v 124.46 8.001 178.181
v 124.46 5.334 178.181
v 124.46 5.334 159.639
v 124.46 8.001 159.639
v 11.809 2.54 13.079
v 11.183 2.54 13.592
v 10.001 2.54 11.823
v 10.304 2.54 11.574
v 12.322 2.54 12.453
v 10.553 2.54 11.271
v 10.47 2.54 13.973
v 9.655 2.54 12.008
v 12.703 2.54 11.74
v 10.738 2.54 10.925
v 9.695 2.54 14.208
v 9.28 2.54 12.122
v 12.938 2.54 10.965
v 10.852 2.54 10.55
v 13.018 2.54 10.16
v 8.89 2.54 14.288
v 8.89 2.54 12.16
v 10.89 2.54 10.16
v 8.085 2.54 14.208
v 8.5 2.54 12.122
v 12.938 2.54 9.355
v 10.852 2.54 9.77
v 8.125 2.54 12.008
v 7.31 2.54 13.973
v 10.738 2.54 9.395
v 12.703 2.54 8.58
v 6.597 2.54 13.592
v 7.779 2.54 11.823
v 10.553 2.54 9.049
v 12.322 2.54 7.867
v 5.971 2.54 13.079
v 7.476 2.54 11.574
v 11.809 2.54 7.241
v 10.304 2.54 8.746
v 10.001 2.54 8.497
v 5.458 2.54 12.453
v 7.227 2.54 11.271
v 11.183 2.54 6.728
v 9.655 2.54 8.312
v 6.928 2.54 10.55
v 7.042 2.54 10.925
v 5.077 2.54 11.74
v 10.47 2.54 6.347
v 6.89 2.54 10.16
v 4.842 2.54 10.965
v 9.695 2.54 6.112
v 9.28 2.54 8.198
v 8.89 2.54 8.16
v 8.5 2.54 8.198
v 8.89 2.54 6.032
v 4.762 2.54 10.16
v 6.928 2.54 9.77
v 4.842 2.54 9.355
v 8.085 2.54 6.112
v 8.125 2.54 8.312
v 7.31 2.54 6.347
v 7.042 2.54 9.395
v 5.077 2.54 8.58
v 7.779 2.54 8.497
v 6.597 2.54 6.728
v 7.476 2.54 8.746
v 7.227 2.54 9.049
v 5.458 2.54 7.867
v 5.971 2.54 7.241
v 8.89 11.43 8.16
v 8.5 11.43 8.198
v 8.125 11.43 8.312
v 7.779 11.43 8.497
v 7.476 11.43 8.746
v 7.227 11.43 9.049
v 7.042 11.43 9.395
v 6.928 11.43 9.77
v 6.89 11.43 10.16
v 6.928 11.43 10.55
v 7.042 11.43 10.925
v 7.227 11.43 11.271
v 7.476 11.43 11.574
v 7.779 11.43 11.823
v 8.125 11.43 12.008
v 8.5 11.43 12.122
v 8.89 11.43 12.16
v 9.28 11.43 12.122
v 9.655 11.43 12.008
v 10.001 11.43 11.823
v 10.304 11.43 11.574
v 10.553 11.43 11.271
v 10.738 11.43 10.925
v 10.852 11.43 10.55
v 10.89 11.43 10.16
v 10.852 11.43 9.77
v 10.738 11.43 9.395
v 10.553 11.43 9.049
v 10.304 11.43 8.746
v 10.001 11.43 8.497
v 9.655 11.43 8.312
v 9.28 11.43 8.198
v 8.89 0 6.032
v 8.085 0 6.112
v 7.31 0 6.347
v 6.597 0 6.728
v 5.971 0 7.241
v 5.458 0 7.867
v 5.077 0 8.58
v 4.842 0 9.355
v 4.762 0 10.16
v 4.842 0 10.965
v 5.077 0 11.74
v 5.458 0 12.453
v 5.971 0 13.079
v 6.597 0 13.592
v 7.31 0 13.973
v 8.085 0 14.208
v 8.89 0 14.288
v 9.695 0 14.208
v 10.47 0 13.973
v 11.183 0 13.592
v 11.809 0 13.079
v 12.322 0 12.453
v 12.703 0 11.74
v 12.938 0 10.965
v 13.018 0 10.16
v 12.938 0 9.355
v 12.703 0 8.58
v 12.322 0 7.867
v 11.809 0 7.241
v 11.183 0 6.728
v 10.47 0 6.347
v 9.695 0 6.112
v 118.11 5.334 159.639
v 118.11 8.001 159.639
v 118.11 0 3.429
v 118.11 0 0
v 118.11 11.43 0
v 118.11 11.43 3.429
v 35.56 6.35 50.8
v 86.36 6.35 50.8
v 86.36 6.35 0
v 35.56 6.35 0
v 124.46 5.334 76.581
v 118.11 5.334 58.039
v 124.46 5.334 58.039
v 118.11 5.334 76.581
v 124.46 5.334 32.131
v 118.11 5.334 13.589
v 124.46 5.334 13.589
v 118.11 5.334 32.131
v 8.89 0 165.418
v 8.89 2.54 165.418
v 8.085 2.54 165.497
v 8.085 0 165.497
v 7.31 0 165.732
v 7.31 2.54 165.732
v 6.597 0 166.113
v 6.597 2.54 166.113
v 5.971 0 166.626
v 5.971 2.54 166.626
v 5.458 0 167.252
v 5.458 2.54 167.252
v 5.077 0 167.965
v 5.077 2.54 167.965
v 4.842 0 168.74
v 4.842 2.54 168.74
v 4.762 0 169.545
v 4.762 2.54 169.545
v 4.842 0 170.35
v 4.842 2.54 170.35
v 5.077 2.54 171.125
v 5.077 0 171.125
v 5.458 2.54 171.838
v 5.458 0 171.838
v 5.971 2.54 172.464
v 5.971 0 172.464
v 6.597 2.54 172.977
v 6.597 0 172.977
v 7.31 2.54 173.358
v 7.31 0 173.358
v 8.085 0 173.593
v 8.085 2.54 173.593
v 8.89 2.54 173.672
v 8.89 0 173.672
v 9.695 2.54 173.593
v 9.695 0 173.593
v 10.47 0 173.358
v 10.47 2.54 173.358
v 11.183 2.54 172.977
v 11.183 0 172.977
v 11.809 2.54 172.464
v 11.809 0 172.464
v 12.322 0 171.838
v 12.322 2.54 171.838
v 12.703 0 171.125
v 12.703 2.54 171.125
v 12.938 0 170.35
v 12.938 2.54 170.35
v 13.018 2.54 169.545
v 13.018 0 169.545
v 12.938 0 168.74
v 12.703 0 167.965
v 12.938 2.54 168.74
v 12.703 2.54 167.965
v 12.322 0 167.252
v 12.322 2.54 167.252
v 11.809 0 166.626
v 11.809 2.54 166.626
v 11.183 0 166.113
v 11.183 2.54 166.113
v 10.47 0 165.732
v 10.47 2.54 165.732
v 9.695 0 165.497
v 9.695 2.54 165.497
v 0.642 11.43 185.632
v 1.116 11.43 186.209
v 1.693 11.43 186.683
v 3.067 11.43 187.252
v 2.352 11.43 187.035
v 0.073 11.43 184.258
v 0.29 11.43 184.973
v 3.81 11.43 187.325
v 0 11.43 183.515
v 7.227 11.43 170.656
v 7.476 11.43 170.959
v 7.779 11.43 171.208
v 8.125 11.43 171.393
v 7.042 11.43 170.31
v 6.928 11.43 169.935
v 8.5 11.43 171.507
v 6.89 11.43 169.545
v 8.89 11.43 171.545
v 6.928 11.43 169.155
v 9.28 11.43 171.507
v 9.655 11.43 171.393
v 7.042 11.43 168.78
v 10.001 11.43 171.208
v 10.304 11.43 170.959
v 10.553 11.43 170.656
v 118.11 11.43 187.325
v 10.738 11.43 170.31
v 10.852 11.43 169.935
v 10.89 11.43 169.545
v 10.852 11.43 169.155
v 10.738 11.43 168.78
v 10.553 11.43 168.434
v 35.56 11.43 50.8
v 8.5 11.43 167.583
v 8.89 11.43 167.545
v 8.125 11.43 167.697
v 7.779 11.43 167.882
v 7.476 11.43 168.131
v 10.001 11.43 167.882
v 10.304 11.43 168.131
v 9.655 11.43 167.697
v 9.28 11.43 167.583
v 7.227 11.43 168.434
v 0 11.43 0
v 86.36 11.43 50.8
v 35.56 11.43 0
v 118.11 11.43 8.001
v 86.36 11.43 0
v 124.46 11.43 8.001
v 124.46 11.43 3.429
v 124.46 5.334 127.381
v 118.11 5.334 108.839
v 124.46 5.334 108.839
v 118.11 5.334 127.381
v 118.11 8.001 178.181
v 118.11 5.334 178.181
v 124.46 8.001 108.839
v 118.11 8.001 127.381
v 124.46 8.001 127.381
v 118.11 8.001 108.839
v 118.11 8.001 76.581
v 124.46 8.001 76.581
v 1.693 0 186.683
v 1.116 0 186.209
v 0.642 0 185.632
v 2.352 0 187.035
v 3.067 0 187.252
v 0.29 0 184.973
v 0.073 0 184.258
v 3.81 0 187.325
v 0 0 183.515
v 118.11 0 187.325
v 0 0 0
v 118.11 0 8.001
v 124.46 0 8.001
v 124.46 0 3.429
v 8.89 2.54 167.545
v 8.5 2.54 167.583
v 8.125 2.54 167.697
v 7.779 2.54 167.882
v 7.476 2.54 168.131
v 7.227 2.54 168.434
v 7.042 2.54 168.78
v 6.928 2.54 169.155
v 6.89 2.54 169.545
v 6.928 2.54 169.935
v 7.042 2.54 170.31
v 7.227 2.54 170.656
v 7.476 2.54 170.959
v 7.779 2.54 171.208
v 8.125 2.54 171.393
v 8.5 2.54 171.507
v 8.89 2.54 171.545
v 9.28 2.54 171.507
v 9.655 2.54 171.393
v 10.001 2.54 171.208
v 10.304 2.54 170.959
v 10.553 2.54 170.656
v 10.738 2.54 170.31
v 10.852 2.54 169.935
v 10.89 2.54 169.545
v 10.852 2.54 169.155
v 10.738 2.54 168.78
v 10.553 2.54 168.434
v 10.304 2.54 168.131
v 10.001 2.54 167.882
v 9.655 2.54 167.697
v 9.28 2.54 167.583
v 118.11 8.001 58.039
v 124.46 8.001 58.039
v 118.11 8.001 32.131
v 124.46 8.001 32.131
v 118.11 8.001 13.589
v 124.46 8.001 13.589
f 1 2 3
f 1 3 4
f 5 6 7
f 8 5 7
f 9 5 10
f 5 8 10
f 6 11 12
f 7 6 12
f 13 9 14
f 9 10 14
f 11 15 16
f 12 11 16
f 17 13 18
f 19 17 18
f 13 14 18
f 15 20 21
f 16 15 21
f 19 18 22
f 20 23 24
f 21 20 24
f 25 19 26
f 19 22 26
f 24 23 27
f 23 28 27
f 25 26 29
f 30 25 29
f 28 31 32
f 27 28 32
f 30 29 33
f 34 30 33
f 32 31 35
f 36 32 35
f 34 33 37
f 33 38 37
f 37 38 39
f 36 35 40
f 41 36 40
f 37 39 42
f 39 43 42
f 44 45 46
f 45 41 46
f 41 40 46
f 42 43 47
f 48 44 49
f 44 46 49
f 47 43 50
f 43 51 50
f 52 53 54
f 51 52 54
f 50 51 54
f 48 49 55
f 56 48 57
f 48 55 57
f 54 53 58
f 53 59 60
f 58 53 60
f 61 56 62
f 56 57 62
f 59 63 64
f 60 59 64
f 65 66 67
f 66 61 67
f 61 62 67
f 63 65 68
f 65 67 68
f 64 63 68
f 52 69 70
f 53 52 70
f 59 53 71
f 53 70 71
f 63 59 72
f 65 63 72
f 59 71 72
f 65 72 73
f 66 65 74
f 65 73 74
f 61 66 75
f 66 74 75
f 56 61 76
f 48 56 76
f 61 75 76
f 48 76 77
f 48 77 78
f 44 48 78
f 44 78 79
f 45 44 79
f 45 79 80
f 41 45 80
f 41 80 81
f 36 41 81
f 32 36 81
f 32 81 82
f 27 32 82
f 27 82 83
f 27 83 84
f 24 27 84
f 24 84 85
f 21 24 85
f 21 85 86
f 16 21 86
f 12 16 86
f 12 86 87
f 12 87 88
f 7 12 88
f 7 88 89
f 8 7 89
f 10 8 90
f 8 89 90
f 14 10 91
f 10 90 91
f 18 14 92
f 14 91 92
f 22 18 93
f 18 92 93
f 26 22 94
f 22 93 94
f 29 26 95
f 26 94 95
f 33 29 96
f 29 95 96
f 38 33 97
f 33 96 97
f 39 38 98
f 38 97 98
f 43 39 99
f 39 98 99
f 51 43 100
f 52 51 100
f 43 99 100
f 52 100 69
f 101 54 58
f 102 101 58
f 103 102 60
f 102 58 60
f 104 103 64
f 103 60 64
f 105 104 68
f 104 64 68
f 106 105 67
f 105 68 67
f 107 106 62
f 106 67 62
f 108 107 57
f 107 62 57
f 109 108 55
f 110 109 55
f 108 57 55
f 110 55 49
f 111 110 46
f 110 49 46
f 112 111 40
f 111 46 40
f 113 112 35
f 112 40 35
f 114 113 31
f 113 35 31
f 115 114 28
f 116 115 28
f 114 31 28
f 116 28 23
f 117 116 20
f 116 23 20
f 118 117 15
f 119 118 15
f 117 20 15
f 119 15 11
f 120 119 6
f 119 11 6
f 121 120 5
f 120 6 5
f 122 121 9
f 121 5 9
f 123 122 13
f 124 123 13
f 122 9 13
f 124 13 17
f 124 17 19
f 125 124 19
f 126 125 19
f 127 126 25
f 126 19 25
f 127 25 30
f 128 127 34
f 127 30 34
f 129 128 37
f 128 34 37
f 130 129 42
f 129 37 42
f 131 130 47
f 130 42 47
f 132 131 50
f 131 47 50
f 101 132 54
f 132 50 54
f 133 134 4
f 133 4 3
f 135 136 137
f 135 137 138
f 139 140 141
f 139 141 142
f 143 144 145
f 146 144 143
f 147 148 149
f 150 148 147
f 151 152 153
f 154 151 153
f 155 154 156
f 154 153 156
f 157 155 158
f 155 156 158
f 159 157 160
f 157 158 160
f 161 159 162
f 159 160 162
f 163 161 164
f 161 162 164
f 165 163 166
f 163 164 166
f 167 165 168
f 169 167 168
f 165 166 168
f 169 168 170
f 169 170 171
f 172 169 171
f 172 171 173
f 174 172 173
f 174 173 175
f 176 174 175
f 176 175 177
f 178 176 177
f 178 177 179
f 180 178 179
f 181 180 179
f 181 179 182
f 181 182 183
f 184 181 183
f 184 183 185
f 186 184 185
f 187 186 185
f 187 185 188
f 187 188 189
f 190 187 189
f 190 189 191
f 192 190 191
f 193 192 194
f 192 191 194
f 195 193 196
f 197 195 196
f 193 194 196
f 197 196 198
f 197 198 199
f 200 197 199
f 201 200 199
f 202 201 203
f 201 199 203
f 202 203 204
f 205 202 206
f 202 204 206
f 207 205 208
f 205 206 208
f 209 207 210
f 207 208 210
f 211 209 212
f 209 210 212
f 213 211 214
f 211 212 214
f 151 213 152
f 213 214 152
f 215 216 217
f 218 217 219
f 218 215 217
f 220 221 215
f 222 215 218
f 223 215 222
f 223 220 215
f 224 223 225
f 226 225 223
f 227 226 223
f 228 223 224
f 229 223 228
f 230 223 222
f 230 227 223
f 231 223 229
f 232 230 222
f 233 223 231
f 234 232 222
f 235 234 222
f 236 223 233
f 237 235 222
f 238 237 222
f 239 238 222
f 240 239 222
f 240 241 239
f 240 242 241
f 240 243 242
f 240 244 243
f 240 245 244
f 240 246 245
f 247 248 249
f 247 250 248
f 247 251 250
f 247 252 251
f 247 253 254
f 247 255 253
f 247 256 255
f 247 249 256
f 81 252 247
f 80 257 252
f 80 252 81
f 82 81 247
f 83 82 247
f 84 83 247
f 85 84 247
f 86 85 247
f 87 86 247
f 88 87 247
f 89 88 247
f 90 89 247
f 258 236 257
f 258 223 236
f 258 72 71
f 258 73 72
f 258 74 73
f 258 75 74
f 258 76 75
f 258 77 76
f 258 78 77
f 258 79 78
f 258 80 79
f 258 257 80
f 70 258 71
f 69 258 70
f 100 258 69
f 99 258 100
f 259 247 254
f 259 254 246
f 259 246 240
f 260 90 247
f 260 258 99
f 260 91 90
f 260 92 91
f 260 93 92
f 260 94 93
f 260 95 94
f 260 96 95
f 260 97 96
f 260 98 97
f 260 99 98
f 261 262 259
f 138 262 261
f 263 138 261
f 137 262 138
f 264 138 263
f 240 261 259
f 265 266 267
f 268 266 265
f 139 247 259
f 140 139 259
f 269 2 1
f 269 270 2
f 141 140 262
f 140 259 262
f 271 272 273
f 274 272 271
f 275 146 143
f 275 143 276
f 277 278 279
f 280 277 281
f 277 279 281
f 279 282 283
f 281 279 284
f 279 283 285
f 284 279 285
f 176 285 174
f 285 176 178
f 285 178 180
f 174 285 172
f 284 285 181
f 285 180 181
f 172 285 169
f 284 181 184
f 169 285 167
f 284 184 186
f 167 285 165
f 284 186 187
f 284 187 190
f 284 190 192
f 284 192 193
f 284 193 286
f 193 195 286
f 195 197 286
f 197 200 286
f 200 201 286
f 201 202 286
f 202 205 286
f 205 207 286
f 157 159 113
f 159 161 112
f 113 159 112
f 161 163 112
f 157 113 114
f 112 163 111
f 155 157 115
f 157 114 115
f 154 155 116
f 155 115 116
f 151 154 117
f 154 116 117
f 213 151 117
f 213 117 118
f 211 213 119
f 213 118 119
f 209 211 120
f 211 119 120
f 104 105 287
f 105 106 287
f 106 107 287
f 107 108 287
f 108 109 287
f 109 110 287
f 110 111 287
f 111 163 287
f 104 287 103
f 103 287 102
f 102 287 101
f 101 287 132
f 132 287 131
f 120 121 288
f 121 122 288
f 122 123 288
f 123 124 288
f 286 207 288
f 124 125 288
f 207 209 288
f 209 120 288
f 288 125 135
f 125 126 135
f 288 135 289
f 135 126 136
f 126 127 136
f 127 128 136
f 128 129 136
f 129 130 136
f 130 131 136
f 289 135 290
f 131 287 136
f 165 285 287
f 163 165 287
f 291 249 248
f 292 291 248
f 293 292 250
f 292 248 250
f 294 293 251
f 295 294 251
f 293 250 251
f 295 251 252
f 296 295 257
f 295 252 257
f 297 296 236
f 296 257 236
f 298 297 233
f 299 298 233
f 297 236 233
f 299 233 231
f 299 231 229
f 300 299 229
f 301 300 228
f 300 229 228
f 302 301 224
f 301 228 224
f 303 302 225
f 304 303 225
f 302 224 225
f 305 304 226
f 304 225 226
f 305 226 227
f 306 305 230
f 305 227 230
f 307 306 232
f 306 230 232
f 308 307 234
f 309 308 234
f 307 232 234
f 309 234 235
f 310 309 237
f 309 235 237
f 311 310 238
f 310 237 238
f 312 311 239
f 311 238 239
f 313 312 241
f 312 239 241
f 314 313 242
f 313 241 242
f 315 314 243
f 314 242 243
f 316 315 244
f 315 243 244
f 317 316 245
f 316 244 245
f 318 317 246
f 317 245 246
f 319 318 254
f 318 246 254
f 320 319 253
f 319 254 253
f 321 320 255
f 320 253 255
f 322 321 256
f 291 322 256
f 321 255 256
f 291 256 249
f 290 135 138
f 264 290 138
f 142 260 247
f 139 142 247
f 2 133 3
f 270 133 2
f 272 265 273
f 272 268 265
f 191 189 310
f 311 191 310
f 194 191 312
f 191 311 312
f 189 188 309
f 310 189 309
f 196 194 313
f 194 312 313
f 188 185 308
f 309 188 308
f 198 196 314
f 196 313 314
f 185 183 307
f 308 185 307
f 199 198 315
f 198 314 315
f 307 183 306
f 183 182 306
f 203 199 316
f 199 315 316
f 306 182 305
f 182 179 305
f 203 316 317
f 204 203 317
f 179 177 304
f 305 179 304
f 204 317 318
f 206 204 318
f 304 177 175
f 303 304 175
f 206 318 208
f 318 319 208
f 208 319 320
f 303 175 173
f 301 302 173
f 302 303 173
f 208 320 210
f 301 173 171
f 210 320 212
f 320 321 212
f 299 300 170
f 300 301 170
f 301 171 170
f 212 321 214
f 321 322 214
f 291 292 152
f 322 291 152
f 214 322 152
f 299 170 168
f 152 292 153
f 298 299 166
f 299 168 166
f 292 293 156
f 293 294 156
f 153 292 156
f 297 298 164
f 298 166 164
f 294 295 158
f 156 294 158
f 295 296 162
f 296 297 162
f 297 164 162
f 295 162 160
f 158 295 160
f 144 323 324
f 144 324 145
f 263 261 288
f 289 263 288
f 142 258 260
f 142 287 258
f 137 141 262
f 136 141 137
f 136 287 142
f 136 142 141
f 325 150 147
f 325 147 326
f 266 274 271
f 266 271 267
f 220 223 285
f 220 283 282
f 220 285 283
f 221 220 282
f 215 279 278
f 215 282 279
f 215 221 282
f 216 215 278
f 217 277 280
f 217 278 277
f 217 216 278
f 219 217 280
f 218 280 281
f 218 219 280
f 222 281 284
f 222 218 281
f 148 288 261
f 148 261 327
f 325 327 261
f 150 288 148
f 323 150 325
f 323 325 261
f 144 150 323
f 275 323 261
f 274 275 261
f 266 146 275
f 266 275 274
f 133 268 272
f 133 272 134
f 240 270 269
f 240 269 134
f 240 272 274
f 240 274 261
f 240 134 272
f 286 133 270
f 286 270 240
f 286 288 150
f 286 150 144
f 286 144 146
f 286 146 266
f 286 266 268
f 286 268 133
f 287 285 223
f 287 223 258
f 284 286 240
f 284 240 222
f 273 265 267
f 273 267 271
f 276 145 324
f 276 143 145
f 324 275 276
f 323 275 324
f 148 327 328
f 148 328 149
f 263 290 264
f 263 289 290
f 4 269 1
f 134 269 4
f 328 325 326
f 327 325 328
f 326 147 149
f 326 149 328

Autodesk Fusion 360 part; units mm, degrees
sketch "Sketch1" plane through (0, 0, 0) normal (0, 1, 0) x (1, 0, 0)
  line L0 (0, 0) -> (118.11, 0)
  line L1 (118.11, 0) -> (118.11, -187.325)
  line L2 (118.11, -187.325) -> (0, -187.325)
  line L3 (0, -187.325) -> (0, 0)
  dimension "d1" = 118.11
  dimension "d2" = 187.325
extrude "Extrude1" add sketch "Sketch1" along normal blind 11.43
fillet "Fillet1" radius 3.81 1 edges at (0, 5.715, 187.325)
sketch "Sketch2" plane through (118.11, 0, 0) normal (1, 0, 0) x (0, 1, 0)
  line L0 (0, 187.325) -> (0, 0)
  line L1 (0, 0) -> (11.43, 0)
  line L2 (11.43, 0) -> (11.43, 187.325)
  line L3 (11.43, 187.325) -> (0, 187.325)
  line L4 (5.08, 178.435) -> (8.255, 178.435)
  line L5 (8.255, 178.435) -> (8.255, 159.385)
  line L6 (8.255, 159.385) -> (5.08, 159.385)
  line L7 (5.08, 159.385) -> (5.08, 178.435)
  line L8 (5.08, 127.635) -> (8.255, 127.635)
  line L9 (8.255, 127.635) -> (8.255, 108.585)
  line L10 (8.255, 108.585) -> (5.08, 108.585)
  line L11 (5.08, 108.585) -> (5.08, 127.635)
  line L12 (5.08, 76.835) -> (8.255, 76.835)
  line L13 (8.255, 76.835) -> (8.255, 57.785)
  line L14 (8.255, 57.785) -> (5.08, 57.785)
  line L15 (5.08, 57.785) -> (5.08, 76.835)
  line L16 (5.08, 32.385) -> (8.255, 32.385)
  line L17 (8.255, 32.385) -> (8.255, 13.335)
  line L18 (8.255, 13.335) -> (5.08, 13.335)
  line L19 (5.08, 13.335) -> (5.08, 32.385)
  line L20 (11.43, 8.001) -> (0, 8.001)
  line L21 (0, 8.001) -> (0, 3.429)
  line L22 (0, 3.429) -> (11.43, 3.429)
  line L23 (11.43, 3.429) -> (11.43, 8.001)
  line L24 (5.334, 32.131) -> (8.001, 32.131)
  line L25 (8.001, 32.131) -> (8.001, 13.589)
  line L26 (8.001, 13.589) -> (5.334, 13.589)
  line L27 (5.334, 13.589) -> (5.334, 32.131)
  line L28 (8.001, 76.581) -> (8.001, 58.039)
  line L29 (8.001, 58.039) -> (5.334, 58.039)
  line L30 (5.334, 58.039) -> (5.334, 76.581)
  line L31 (5.334, 76.581) -> (8.001, 76.581)
  line L32 (8.001, 127.381) -> (8.001, 108.839)
  line L33 (8.001, 108.839) -> (5.334, 108.839)
  line L34 (5.334, 108.839) -> (5.334, 127.381)
  line L35 (5.334, 127.381) -> (8.001, 127.381)
  line L36 (8.001, 178.181) -> (8.001, 159.639)
  line L37 (8.001, 159.639) -> (5.334, 159.639)
  line L38 (5.334, 159.639) -> (5.334, 178.181)
  line L39 (5.334, 178.181) -> (8.001, 178.181)
  dimension "d7" = 8.89
  dimension "d8" = 3.175
  dimension "d9" = 5.08
  dimension "d10" = 19.05
  dimension "d11" = 19.05
  dimension "d12" = 5.08
  dimension "d13" = 31.75
  dimension "d14" = 3.175
  dimension "d15" = 19.05
  dimension "d16" = 5.08
  dimension "d17" = 31.75
  dimension "d18" = 3.175
  dimension "d19" = 3.175
  dimension "d20" = 19.05
  dimension "d21" = 25.4
  dimension "d22" = 5.08
  dimension "d44" = 4.572
  dimension "d45" = 11.43
  dimension "d46" = 0.254
  dimension "d47" = 0.254
  dimension "d48" = 0.254
  dimension "d49" = 0.254
  dimension "d50" = 3.429
extrude "Extrude2" add sketch "Sketch2" along normal blind 6.35 contours L0 L2 L20 L21 L22 L23 | L24 L25 L26 L27 | L28 L29 L30 L31 | L32 L33 L34 L35 | L36 L37 L38 L39
sketch "Sketch3" plane through (0, 0, 0) normal (0, 0, -1) x (1, 0, 0)
  line L0 (118.11, 0) -> (0, 0)
  line L1 (0, 0) -> (0, -11.43)
  line L2 (0, -11.43) -> (118.11, -11.43)
  line L3 (118.11, -11.43) -> (118.11, 0)
  line L4 (6.35, -5.08) -> (25.4, -5.08)
  line L5 (25.4, -5.08) -> (25.4, -8.255)
  line L6 (25.4, -8.255) -> (6.35, -8.255)
  line L7 (6.35, -8.255) -> (6.35, -5.08)
  dimension "d25" = 19.05
  dimension "d26" = 3.175
  dimension "d27" = 6.35
  dimension "d38" = 5.08
extrude "Extrude3" add sketch "Sketch3" along normal blind 3.175 contours L4 L5 L6 L7
sketch "Sketch4" plane through (0, 0, 0) normal (0, -1, 0) x (1, 0, 0)
  arc A0 (3.81, 187.325) -> (0, 183.515) centre (3.81, 183.515) ccw
  line L0 (0, 183.515) -> (0, 0)
  line L1 (0, 0) -> (118.11, 0)
  line L2 (118.11, 0) -> (118.11, 3.429)
  line L3 (118.11, 187.325) -> (3.81, 187.325)
  line L4 (118.11, 3.429) -> (124.46, 3.429)
  line L5 (124.46, 3.429) -> (124.46, 8.001)
  line L6 (124.46, 8.001) -> (118.11, 8.001)
  line L7 (118.11, 8.001) -> (118.11, 187.325)
  point P0 (8.89, 169.545)
  point P1 (8.89, 10.16)
  dimension "d31" = 17.78
  dimension "d32" = 8.89
  dimension "d41" = 10.16
  dimension "d42" = 8.89
hole "Hole1" at (8.89, 0, 169.545) at (8.89, 0, 10.16) direction (0, 1, 0) diameter 4 depth 15.24 tip angle 180 counterbore diameter 8.255 counterbore depth 2.54
extrude "Extrude4" cut 1 faces at (12.7, 7.1967, -3.175) along direction (0, 0, 1) blind 3.175
sketch "Sketch6" plane through (0, 11.43, 0) normal (0, 1, 0) x (-1, 0, 0)
  circle A0 centre (-8.89, 169.545) radius 2
  circle A1 centre (-8.89, 10.16) radius 2
  arc A2 (0, 183.515) -> (-3.81, 187.325) centre (-3.81, 183.515) ccw
  line L0 (-3.81, 187.325) -> (-118.11, 187.325)
  line L1 (-118.11, 187.325) -> (-118.11, 8.001)
  line L2 (-118.11, 8.001) -> (-124.46, 8.001)
  line L3 (-124.46, 8.001) -> (-124.46, 3.429)
  line L4 (-124.46, 3.429) -> (-118.11, 3.429)
  line L5 (-118.11, 3.429) -> (-118.11, 0)
  line L6 (-118.11, 0) -> (0, 0)
  line L7 (0, 0) -> (0, 183.515)
  line L8 (-86.36, 0) -> (-35.56, 0)
  line L9 (-35.56, 0) -> (-35.56, 50.8)
  line L10 (-35.56, 50.8) -> (-86.36, 50.8)
  line L11 (-86.36, 50.8) -> (-86.36, 0)
  point P0 (-60.96, 187.325)
  point P1 (-60.96, 50.8)
  dimension "d51" = 50.8
  dimension "d52" = 50.8
extrude "Extrude5" cut sketch "Sketch6" against normal blind 5.08 contours L6 L8 L9 L10 L11
